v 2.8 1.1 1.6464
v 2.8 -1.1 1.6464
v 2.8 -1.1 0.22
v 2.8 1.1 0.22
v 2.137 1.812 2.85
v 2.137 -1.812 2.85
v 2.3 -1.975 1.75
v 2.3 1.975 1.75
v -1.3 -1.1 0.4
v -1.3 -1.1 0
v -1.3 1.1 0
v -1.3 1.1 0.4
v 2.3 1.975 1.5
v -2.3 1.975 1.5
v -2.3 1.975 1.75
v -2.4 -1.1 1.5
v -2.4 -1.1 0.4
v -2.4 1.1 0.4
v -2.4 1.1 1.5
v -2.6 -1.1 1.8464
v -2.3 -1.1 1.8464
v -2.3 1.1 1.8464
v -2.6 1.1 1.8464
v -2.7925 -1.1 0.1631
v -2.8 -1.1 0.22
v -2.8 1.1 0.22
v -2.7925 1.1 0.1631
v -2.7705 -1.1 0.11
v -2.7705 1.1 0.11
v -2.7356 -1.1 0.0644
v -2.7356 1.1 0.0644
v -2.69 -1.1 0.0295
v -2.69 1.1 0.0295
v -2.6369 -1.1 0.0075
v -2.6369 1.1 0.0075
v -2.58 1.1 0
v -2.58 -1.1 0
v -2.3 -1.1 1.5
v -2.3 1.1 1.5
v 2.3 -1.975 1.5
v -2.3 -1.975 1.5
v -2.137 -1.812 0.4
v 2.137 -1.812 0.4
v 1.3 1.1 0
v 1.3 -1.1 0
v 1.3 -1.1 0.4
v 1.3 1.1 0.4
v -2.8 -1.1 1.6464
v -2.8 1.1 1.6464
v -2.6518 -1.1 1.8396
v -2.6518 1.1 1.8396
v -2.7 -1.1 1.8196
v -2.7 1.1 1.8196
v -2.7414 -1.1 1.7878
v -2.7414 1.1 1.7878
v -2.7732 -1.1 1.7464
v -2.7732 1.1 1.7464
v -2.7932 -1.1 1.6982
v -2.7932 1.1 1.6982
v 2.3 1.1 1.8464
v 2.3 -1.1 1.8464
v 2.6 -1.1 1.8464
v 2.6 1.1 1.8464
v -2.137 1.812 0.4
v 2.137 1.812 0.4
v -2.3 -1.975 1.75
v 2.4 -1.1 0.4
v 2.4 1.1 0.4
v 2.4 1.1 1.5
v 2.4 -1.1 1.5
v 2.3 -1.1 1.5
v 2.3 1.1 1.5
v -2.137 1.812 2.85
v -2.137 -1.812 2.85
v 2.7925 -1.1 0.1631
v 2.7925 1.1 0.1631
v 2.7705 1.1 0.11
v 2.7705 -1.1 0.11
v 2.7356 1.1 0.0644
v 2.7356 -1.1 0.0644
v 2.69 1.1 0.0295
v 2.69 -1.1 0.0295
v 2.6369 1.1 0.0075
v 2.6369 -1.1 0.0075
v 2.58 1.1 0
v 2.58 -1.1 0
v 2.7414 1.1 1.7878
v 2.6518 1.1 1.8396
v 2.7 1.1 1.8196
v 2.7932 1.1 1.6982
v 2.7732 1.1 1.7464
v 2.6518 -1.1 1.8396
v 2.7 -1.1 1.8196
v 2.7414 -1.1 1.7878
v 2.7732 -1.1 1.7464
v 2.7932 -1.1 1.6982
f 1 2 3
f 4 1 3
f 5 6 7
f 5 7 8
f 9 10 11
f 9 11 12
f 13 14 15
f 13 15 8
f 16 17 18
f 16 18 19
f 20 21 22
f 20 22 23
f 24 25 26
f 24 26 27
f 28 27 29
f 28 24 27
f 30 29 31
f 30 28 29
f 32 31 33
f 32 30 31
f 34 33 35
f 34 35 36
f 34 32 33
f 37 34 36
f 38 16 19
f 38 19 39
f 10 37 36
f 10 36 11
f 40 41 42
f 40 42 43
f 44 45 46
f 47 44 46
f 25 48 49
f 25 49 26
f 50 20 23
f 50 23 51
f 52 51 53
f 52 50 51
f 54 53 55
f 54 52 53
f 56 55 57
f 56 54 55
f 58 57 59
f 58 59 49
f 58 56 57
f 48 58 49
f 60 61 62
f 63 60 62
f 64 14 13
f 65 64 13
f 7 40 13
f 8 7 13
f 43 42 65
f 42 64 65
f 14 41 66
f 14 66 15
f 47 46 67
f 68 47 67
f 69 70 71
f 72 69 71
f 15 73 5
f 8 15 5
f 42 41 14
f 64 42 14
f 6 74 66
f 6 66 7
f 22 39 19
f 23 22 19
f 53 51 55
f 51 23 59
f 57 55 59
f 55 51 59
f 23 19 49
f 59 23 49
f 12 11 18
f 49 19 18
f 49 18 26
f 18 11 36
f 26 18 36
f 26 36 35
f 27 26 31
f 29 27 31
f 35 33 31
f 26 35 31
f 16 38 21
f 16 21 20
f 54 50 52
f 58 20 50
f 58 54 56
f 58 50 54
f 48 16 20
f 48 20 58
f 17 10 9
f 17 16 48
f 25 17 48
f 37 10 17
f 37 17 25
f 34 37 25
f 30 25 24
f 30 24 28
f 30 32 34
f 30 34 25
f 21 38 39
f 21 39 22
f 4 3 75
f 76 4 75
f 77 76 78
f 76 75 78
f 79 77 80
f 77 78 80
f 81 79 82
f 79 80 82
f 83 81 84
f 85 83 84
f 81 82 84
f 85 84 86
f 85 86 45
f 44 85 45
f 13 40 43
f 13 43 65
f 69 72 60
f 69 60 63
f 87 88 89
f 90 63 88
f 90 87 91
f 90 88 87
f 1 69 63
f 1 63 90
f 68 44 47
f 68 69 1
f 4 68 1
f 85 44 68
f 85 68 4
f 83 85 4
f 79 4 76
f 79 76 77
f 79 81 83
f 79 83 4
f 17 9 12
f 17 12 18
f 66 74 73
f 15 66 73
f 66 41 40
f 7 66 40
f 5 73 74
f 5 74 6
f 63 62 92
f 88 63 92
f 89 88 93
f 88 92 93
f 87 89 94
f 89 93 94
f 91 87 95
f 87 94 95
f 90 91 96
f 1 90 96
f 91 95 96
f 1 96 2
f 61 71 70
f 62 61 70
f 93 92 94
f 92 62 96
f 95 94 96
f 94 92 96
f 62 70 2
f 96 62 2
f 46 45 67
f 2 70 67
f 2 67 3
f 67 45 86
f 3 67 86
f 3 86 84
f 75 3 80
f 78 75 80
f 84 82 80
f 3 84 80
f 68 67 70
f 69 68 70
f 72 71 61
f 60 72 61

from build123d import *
from OCP.BRepFilletAPI import BRepFilletAPI_MakeChamfer

# Parameters (mm, degrees)
SKETCH_1_W           = 4.6
SKETCH_1_H           = 3.95
EXTRUDE_1_DEPTH      = 2.45
CHAMFER_1_SIZE       = 1.1
CHAMFER_1_SIZE2      = 0.163
CHAMFER_2_SIZE       = 0.163
CHAMFER_2_SIZE2      = 1.1
EXTRUDE_2_DEPTH      = 1.1
EXTRUDE_2_DEPTH_BACK = 1.1


with BuildPart() as part:
    # Эскиз1 → Бобышка-Вытянуть1 (new body)
    with BuildSketch(Plane.XY.offset(0.4)):
        Rectangle(SKETCH_1_W, SKETCH_1_H)
    extrude(amount=EXTRUDE_1_DEPTH)

    # Фаска1: one chamfer whose edges measure the first distance from different faces: ONE call of the kernel's chamfer builder (chamfer() names one face for all edges)
    chamfer_1_edges_1 = [part.edges().sort_by_distance(p)[0] for p in [
        (-2.3, 0, 2.85),
    ]]
    chamfer_1_side_1 = [part.faces().sort_by_distance(p)[0] for p in [
        (-2.3, 0, 1.625),
    ]]
    chamfer_1_edges_2 = [part.edges().sort_by_distance(p)[0] for p in [
        (0, -1.975, 2.85),
    ]]
    chamfer_1_side_2 = [part.faces().sort_by_distance(p)[0] for p in [
        (0, -1.975, 1.625),
    ]]
    chamfer_1_edges_3 = [part.edges().sort_by_distance(p)[0] for p in [
        (2.3, 0, 2.85),
    ]]
    chamfer_1_side_3 = [part.faces().sort_by_distance(p)[0] for p in [
        (2.3, 0, 1.625),
    ]]
    chamfer_1_edges_4 = [part.edges().sort_by_distance(p)[0] for p in [
        (0, 1.975, 2.85),
    ]]
    chamfer_1_side_4 = [part.faces().sort_by_distance(p)[0] for p in [
        (0, 1.975, 1.625),
    ]]
    chamfer_1 = BRepFilletAPI_MakeChamfer(part.part.solid().wrapped)
    for e in chamfer_1_edges_1:
        chamfer_1.Add(CHAMFER_1_SIZE, CHAMFER_1_SIZE2, e.wrapped, chamfer_1_side_1[0].wrapped)  # the first distance lies on this face
    for e in chamfer_1_edges_2:
        chamfer_1.Add(CHAMFER_1_SIZE, CHAMFER_1_SIZE2, e.wrapped, chamfer_1_side_2[0].wrapped)  # the first distance lies on this face
    for e in chamfer_1_edges_3:
        chamfer_1.Add(CHAMFER_1_SIZE, CHAMFER_1_SIZE2, e.wrapped, chamfer_1_side_3[0].wrapped)  # the first distance lies on this face
    for e in chamfer_1_edges_4:
        chamfer_1.Add(CHAMFER_1_SIZE, CHAMFER_1_SIZE2, e.wrapped, chamfer_1_side_4[0].wrapped)  # the first distance lies on this face
    add(Compound.cast(chamfer_1.Shape()), mode=Mode.REPLACE)

    # Фаска2
    chamfer_2_edges = [part.edges().sort_by_distance(p)[0] for p in [
        (0, -1.975, 0.4),
        (-2.3, 0, 0.4),
        (0, 1.975, 0.4),
        (2.3, 0, 0.4),
    ]]
    chamfer_2_side = [part.faces().sort_by_distance(p)[0] for p in [
        (0, 0, 0.4),
    ]]
    chamfer(chamfer_2_edges, length=CHAMFER_2_SIZE, length2=CHAMFER_2_SIZE2, reference=chamfer_2_side[0])


with BuildPart() as body_2:
    # Эскиз2 → Бобышка-Вытянуть2 (new, two sides: drawn at the far end of the back side and taken through both)
    with BuildSketch(Plane(origin=(0, 0, 0), x_dir=(1, 0, 0), z_dir=(0, 1, 0)).offset(-EXTRUDE_2_DEPTH_BACK)):
        with BuildLine():
            Line((-2.4, -0.4), (-2.4, -1.5))
            Line((-2.4, -1.5), (-2.3, -1.5))
            Line((-2.3, -1.5), (-2.3, -1.846410162))
            Line((-2.3, -1.846410162), (-2.6, -1.846410162))
            ThreePointArc((-2.6, -1.846410162), (-2.741421356, -1.787831518), (-2.8, -1.646410162))
            Line((-2.8, -1.646410162), (-2.8, -0.22))
            ThreePointArc((-2.8, -0.22), (-2.735563492, -0.064436508), (-2.58, 0))
            Line((-2.58, 0), (-1.3, 0))
            Line((-1.3, 0), (-1.3, -0.4))
            Line((-1.3, -0.4), (-2.4, -0.4))
        make_face()
    extrude(amount=EXTRUDE_2_DEPTH + EXTRUDE_2_DEPTH_BACK)


with BuildPart() as body_3:
    # Зеркальное отражение1: mirrored copy
    add(body_2.part.mirror(Plane(origin=(0, 0, 0), x_dir=(0, 0, 1), z_dir=(1, 0, 0))))


solid = Compound([part.part, body_2.part, body_3.part])
